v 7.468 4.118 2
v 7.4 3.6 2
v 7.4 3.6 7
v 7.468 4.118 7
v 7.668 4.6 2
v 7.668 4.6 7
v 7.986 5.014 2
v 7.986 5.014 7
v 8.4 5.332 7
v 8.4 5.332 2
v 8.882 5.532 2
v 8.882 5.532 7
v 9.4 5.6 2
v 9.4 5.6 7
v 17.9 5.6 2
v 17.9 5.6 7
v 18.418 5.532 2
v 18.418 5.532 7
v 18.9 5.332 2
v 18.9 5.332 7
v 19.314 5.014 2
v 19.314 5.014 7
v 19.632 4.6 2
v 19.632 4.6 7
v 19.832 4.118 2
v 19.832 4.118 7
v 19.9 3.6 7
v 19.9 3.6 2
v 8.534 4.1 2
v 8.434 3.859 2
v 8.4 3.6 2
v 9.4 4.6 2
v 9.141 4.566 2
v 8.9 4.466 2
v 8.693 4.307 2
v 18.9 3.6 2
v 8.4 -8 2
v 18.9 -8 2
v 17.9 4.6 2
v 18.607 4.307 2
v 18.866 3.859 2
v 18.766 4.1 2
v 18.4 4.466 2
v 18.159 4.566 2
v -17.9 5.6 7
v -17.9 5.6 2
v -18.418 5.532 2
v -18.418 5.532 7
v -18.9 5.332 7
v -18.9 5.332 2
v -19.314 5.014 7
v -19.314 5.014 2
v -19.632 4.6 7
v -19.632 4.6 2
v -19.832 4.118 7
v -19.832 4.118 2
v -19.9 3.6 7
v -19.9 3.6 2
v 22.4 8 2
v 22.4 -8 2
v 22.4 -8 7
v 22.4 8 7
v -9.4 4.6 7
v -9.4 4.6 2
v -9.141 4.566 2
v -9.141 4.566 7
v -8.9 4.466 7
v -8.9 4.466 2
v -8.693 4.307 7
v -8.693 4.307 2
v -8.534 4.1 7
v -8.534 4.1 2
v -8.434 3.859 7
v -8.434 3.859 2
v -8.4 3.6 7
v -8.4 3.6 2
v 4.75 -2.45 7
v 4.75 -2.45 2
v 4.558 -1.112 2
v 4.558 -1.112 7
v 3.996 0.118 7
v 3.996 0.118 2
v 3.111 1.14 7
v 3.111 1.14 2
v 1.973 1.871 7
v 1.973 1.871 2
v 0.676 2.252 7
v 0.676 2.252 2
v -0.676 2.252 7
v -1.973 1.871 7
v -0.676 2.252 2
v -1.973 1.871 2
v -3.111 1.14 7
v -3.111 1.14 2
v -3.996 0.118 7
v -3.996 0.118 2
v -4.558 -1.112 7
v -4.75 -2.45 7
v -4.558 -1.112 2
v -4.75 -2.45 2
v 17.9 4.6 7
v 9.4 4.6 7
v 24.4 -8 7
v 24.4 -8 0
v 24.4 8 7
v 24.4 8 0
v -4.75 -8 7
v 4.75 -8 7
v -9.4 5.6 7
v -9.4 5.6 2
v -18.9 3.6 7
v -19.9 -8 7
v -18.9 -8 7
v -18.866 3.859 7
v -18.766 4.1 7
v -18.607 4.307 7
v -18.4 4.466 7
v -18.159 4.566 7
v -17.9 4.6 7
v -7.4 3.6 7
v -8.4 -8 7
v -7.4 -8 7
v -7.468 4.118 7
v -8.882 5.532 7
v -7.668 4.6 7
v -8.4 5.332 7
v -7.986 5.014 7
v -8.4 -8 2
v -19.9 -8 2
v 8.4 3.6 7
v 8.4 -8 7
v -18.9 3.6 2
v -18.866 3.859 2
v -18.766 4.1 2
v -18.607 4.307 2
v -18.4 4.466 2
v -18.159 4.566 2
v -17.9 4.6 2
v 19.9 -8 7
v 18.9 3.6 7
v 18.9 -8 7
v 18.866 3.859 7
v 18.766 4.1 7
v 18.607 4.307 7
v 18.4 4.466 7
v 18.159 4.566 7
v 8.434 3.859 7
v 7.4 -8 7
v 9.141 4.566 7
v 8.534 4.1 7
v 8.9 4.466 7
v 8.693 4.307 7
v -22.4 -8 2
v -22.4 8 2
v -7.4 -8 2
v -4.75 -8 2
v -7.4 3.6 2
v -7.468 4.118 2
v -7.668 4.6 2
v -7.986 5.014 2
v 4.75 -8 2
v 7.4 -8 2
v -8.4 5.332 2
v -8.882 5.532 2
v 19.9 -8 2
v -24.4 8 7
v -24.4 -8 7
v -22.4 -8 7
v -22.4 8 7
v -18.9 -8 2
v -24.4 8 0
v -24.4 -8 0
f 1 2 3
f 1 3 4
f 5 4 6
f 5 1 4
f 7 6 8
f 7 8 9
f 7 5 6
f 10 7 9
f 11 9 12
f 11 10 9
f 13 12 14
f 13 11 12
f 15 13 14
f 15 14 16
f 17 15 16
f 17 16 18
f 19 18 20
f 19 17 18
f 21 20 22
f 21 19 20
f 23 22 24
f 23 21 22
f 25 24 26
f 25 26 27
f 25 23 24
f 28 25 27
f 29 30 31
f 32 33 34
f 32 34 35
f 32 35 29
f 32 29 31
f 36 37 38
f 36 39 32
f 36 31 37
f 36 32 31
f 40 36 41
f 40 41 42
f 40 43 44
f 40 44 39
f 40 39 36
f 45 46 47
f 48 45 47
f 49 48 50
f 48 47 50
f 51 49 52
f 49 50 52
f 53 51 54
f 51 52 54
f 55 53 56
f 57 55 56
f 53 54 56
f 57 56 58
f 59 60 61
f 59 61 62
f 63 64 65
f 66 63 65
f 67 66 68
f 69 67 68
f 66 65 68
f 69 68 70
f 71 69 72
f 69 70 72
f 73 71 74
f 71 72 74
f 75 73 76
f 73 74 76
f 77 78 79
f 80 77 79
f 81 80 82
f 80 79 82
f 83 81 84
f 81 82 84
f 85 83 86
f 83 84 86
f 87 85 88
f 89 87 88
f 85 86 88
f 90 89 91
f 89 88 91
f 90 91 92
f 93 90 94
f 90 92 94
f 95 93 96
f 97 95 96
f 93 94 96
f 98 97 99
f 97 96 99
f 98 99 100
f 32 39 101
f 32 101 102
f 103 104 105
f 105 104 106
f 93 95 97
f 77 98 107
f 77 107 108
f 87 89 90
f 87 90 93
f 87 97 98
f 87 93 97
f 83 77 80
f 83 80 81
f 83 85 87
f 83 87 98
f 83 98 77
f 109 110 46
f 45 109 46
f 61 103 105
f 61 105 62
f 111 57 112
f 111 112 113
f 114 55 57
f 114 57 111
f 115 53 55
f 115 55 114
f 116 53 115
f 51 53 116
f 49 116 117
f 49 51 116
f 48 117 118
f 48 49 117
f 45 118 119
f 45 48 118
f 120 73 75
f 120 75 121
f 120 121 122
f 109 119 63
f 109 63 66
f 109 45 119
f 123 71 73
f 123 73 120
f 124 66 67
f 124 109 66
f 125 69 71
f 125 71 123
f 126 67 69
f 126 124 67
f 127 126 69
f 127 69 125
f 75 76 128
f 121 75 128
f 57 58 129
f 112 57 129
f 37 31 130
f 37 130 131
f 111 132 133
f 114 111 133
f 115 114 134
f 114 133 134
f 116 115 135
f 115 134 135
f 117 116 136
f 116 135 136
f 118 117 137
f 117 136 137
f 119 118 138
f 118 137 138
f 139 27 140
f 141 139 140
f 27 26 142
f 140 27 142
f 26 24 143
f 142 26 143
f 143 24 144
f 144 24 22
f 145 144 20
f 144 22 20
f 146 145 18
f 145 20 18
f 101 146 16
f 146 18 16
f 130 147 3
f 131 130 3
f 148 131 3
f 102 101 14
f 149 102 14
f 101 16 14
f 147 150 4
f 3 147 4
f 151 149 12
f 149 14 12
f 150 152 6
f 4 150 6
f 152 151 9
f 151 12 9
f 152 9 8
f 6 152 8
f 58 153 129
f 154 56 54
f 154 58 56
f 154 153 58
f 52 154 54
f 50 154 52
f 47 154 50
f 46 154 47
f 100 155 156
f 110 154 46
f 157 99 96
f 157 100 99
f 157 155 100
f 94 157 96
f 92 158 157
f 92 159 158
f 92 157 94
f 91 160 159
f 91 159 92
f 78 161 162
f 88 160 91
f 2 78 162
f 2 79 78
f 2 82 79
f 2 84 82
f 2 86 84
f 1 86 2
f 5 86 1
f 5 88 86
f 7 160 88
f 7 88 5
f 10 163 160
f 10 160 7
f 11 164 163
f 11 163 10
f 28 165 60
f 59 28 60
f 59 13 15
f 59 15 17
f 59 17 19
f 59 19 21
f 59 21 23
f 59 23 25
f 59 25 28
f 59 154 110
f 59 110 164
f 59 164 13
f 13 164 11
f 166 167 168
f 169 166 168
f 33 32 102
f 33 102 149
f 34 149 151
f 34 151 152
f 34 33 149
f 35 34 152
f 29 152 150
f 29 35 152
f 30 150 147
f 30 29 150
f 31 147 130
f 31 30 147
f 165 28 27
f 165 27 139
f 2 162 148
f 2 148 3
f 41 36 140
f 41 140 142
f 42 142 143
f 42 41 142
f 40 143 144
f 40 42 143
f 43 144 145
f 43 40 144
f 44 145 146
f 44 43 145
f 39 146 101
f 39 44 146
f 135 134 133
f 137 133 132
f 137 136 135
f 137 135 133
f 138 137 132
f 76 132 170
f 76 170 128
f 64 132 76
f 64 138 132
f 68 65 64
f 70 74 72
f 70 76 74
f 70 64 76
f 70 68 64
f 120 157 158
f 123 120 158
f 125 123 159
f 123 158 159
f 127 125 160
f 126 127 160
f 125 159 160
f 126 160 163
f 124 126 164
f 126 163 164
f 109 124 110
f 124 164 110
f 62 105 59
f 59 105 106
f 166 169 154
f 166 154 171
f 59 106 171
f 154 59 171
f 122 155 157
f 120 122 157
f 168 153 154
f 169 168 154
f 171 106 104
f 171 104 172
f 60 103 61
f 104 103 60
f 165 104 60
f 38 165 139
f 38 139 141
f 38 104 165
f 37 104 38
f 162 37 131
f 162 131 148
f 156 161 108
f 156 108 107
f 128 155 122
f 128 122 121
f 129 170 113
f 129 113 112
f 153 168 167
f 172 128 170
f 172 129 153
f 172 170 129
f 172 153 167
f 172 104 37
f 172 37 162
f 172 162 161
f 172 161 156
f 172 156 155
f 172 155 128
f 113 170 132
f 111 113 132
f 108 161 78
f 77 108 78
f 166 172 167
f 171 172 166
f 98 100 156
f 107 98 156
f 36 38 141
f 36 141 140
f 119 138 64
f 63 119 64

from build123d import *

# Parameters (mm, degrees)
F0_W     = 44.8
F0_H     = 16
F1_DEPTH = 2
F4_DEPTH = 5
F5_DEPTH = 5
F6_W     = 2
F6_H     = 16
F7_DEPTH = 7


# Not quite as in the source:
# - a pattern or mirror of a feature is missing from the dataset's text; its kind, count and spacing are read off the source's solid


with BuildPart() as f1:
    # F0 (on Top) → F1 (new body)
    with BuildSketch(Plane.XY):
        Rectangle(F0_W, F0_H)
    extrude(amount=F1_DEPTH)

    # F2 (on face) → F4 (join)
    with BuildSketch(Plane.XY.offset(2)):
        with BuildLine():
            Line((-19.9, 3.6), (-19.9, -8))
            Line((-19.9, -8), (-18.9, -8))
            Line((-18.9, -8), (-18.9, 3.6))
            ThreePointArc((-18.9, 3.6), (-18.6071067812, 4.3071067812), (-17.9, 4.6))
            Line((-17.9, 4.6), (-9.4, 4.6))
            ThreePointArc((-9.4, 4.6), (-8.6928932188, 4.3071067812), (-8.4, 3.6))
            Line((-8.4, 3.6), (-8.4, -8))
            Line((-8.4, -8), (-7.4, -8))
            Line((-7.4, -8), (-7.4, 3.6))
            ThreePointArc((-7.4, 3.6), (-7.9857864376, 5.0142135624), (-9.4, 5.6))
            Line((-9.4, 5.6), (-17.9, 5.6))
            ThreePointArc((-17.9, 5.6), (-19.3142135624, 5.0142135624), (-19.9, 3.6))
        make_face()
    f4 = extrude(amount=F4_DEPTH)

    # F4_copies: F4 across plane
    add(f4.mirror(Plane(origin=(0, 0, 0), x_dir=(0, 0, 1), z_dir=(1, 0, 0))))

    # F3 (on face) → F5 (join)
    with BuildSketch(Plane.XY.offset(2)):
        with BuildLine():
            Line((4.75, -8), (4.75, -2.45))
            ThreePointArc((4.75, -2.45), (0, 2.3), (-4.75, -2.45))
            Line((-4.75, -2.45), (-4.75, -8))
            Line((-4.75, -8), (4.75, -8))
        make_face()
    extrude(amount=F5_DEPTH)

    # F6 (on Top) → F7 (join, through all)
    with BuildSketch(Plane.XY):
        with Locations((-23.4, 0)):
            Rectangle(F6_W, F6_H)
    f7 = extrude(amount=F7_DEPTH)

    # F7_copies: F7 across plane
    add(f7.mirror(Plane(origin=(0, 0, 0), x_dir=(0, 0, 1), z_dir=(1, 0, 0))))


solid = f1.part
